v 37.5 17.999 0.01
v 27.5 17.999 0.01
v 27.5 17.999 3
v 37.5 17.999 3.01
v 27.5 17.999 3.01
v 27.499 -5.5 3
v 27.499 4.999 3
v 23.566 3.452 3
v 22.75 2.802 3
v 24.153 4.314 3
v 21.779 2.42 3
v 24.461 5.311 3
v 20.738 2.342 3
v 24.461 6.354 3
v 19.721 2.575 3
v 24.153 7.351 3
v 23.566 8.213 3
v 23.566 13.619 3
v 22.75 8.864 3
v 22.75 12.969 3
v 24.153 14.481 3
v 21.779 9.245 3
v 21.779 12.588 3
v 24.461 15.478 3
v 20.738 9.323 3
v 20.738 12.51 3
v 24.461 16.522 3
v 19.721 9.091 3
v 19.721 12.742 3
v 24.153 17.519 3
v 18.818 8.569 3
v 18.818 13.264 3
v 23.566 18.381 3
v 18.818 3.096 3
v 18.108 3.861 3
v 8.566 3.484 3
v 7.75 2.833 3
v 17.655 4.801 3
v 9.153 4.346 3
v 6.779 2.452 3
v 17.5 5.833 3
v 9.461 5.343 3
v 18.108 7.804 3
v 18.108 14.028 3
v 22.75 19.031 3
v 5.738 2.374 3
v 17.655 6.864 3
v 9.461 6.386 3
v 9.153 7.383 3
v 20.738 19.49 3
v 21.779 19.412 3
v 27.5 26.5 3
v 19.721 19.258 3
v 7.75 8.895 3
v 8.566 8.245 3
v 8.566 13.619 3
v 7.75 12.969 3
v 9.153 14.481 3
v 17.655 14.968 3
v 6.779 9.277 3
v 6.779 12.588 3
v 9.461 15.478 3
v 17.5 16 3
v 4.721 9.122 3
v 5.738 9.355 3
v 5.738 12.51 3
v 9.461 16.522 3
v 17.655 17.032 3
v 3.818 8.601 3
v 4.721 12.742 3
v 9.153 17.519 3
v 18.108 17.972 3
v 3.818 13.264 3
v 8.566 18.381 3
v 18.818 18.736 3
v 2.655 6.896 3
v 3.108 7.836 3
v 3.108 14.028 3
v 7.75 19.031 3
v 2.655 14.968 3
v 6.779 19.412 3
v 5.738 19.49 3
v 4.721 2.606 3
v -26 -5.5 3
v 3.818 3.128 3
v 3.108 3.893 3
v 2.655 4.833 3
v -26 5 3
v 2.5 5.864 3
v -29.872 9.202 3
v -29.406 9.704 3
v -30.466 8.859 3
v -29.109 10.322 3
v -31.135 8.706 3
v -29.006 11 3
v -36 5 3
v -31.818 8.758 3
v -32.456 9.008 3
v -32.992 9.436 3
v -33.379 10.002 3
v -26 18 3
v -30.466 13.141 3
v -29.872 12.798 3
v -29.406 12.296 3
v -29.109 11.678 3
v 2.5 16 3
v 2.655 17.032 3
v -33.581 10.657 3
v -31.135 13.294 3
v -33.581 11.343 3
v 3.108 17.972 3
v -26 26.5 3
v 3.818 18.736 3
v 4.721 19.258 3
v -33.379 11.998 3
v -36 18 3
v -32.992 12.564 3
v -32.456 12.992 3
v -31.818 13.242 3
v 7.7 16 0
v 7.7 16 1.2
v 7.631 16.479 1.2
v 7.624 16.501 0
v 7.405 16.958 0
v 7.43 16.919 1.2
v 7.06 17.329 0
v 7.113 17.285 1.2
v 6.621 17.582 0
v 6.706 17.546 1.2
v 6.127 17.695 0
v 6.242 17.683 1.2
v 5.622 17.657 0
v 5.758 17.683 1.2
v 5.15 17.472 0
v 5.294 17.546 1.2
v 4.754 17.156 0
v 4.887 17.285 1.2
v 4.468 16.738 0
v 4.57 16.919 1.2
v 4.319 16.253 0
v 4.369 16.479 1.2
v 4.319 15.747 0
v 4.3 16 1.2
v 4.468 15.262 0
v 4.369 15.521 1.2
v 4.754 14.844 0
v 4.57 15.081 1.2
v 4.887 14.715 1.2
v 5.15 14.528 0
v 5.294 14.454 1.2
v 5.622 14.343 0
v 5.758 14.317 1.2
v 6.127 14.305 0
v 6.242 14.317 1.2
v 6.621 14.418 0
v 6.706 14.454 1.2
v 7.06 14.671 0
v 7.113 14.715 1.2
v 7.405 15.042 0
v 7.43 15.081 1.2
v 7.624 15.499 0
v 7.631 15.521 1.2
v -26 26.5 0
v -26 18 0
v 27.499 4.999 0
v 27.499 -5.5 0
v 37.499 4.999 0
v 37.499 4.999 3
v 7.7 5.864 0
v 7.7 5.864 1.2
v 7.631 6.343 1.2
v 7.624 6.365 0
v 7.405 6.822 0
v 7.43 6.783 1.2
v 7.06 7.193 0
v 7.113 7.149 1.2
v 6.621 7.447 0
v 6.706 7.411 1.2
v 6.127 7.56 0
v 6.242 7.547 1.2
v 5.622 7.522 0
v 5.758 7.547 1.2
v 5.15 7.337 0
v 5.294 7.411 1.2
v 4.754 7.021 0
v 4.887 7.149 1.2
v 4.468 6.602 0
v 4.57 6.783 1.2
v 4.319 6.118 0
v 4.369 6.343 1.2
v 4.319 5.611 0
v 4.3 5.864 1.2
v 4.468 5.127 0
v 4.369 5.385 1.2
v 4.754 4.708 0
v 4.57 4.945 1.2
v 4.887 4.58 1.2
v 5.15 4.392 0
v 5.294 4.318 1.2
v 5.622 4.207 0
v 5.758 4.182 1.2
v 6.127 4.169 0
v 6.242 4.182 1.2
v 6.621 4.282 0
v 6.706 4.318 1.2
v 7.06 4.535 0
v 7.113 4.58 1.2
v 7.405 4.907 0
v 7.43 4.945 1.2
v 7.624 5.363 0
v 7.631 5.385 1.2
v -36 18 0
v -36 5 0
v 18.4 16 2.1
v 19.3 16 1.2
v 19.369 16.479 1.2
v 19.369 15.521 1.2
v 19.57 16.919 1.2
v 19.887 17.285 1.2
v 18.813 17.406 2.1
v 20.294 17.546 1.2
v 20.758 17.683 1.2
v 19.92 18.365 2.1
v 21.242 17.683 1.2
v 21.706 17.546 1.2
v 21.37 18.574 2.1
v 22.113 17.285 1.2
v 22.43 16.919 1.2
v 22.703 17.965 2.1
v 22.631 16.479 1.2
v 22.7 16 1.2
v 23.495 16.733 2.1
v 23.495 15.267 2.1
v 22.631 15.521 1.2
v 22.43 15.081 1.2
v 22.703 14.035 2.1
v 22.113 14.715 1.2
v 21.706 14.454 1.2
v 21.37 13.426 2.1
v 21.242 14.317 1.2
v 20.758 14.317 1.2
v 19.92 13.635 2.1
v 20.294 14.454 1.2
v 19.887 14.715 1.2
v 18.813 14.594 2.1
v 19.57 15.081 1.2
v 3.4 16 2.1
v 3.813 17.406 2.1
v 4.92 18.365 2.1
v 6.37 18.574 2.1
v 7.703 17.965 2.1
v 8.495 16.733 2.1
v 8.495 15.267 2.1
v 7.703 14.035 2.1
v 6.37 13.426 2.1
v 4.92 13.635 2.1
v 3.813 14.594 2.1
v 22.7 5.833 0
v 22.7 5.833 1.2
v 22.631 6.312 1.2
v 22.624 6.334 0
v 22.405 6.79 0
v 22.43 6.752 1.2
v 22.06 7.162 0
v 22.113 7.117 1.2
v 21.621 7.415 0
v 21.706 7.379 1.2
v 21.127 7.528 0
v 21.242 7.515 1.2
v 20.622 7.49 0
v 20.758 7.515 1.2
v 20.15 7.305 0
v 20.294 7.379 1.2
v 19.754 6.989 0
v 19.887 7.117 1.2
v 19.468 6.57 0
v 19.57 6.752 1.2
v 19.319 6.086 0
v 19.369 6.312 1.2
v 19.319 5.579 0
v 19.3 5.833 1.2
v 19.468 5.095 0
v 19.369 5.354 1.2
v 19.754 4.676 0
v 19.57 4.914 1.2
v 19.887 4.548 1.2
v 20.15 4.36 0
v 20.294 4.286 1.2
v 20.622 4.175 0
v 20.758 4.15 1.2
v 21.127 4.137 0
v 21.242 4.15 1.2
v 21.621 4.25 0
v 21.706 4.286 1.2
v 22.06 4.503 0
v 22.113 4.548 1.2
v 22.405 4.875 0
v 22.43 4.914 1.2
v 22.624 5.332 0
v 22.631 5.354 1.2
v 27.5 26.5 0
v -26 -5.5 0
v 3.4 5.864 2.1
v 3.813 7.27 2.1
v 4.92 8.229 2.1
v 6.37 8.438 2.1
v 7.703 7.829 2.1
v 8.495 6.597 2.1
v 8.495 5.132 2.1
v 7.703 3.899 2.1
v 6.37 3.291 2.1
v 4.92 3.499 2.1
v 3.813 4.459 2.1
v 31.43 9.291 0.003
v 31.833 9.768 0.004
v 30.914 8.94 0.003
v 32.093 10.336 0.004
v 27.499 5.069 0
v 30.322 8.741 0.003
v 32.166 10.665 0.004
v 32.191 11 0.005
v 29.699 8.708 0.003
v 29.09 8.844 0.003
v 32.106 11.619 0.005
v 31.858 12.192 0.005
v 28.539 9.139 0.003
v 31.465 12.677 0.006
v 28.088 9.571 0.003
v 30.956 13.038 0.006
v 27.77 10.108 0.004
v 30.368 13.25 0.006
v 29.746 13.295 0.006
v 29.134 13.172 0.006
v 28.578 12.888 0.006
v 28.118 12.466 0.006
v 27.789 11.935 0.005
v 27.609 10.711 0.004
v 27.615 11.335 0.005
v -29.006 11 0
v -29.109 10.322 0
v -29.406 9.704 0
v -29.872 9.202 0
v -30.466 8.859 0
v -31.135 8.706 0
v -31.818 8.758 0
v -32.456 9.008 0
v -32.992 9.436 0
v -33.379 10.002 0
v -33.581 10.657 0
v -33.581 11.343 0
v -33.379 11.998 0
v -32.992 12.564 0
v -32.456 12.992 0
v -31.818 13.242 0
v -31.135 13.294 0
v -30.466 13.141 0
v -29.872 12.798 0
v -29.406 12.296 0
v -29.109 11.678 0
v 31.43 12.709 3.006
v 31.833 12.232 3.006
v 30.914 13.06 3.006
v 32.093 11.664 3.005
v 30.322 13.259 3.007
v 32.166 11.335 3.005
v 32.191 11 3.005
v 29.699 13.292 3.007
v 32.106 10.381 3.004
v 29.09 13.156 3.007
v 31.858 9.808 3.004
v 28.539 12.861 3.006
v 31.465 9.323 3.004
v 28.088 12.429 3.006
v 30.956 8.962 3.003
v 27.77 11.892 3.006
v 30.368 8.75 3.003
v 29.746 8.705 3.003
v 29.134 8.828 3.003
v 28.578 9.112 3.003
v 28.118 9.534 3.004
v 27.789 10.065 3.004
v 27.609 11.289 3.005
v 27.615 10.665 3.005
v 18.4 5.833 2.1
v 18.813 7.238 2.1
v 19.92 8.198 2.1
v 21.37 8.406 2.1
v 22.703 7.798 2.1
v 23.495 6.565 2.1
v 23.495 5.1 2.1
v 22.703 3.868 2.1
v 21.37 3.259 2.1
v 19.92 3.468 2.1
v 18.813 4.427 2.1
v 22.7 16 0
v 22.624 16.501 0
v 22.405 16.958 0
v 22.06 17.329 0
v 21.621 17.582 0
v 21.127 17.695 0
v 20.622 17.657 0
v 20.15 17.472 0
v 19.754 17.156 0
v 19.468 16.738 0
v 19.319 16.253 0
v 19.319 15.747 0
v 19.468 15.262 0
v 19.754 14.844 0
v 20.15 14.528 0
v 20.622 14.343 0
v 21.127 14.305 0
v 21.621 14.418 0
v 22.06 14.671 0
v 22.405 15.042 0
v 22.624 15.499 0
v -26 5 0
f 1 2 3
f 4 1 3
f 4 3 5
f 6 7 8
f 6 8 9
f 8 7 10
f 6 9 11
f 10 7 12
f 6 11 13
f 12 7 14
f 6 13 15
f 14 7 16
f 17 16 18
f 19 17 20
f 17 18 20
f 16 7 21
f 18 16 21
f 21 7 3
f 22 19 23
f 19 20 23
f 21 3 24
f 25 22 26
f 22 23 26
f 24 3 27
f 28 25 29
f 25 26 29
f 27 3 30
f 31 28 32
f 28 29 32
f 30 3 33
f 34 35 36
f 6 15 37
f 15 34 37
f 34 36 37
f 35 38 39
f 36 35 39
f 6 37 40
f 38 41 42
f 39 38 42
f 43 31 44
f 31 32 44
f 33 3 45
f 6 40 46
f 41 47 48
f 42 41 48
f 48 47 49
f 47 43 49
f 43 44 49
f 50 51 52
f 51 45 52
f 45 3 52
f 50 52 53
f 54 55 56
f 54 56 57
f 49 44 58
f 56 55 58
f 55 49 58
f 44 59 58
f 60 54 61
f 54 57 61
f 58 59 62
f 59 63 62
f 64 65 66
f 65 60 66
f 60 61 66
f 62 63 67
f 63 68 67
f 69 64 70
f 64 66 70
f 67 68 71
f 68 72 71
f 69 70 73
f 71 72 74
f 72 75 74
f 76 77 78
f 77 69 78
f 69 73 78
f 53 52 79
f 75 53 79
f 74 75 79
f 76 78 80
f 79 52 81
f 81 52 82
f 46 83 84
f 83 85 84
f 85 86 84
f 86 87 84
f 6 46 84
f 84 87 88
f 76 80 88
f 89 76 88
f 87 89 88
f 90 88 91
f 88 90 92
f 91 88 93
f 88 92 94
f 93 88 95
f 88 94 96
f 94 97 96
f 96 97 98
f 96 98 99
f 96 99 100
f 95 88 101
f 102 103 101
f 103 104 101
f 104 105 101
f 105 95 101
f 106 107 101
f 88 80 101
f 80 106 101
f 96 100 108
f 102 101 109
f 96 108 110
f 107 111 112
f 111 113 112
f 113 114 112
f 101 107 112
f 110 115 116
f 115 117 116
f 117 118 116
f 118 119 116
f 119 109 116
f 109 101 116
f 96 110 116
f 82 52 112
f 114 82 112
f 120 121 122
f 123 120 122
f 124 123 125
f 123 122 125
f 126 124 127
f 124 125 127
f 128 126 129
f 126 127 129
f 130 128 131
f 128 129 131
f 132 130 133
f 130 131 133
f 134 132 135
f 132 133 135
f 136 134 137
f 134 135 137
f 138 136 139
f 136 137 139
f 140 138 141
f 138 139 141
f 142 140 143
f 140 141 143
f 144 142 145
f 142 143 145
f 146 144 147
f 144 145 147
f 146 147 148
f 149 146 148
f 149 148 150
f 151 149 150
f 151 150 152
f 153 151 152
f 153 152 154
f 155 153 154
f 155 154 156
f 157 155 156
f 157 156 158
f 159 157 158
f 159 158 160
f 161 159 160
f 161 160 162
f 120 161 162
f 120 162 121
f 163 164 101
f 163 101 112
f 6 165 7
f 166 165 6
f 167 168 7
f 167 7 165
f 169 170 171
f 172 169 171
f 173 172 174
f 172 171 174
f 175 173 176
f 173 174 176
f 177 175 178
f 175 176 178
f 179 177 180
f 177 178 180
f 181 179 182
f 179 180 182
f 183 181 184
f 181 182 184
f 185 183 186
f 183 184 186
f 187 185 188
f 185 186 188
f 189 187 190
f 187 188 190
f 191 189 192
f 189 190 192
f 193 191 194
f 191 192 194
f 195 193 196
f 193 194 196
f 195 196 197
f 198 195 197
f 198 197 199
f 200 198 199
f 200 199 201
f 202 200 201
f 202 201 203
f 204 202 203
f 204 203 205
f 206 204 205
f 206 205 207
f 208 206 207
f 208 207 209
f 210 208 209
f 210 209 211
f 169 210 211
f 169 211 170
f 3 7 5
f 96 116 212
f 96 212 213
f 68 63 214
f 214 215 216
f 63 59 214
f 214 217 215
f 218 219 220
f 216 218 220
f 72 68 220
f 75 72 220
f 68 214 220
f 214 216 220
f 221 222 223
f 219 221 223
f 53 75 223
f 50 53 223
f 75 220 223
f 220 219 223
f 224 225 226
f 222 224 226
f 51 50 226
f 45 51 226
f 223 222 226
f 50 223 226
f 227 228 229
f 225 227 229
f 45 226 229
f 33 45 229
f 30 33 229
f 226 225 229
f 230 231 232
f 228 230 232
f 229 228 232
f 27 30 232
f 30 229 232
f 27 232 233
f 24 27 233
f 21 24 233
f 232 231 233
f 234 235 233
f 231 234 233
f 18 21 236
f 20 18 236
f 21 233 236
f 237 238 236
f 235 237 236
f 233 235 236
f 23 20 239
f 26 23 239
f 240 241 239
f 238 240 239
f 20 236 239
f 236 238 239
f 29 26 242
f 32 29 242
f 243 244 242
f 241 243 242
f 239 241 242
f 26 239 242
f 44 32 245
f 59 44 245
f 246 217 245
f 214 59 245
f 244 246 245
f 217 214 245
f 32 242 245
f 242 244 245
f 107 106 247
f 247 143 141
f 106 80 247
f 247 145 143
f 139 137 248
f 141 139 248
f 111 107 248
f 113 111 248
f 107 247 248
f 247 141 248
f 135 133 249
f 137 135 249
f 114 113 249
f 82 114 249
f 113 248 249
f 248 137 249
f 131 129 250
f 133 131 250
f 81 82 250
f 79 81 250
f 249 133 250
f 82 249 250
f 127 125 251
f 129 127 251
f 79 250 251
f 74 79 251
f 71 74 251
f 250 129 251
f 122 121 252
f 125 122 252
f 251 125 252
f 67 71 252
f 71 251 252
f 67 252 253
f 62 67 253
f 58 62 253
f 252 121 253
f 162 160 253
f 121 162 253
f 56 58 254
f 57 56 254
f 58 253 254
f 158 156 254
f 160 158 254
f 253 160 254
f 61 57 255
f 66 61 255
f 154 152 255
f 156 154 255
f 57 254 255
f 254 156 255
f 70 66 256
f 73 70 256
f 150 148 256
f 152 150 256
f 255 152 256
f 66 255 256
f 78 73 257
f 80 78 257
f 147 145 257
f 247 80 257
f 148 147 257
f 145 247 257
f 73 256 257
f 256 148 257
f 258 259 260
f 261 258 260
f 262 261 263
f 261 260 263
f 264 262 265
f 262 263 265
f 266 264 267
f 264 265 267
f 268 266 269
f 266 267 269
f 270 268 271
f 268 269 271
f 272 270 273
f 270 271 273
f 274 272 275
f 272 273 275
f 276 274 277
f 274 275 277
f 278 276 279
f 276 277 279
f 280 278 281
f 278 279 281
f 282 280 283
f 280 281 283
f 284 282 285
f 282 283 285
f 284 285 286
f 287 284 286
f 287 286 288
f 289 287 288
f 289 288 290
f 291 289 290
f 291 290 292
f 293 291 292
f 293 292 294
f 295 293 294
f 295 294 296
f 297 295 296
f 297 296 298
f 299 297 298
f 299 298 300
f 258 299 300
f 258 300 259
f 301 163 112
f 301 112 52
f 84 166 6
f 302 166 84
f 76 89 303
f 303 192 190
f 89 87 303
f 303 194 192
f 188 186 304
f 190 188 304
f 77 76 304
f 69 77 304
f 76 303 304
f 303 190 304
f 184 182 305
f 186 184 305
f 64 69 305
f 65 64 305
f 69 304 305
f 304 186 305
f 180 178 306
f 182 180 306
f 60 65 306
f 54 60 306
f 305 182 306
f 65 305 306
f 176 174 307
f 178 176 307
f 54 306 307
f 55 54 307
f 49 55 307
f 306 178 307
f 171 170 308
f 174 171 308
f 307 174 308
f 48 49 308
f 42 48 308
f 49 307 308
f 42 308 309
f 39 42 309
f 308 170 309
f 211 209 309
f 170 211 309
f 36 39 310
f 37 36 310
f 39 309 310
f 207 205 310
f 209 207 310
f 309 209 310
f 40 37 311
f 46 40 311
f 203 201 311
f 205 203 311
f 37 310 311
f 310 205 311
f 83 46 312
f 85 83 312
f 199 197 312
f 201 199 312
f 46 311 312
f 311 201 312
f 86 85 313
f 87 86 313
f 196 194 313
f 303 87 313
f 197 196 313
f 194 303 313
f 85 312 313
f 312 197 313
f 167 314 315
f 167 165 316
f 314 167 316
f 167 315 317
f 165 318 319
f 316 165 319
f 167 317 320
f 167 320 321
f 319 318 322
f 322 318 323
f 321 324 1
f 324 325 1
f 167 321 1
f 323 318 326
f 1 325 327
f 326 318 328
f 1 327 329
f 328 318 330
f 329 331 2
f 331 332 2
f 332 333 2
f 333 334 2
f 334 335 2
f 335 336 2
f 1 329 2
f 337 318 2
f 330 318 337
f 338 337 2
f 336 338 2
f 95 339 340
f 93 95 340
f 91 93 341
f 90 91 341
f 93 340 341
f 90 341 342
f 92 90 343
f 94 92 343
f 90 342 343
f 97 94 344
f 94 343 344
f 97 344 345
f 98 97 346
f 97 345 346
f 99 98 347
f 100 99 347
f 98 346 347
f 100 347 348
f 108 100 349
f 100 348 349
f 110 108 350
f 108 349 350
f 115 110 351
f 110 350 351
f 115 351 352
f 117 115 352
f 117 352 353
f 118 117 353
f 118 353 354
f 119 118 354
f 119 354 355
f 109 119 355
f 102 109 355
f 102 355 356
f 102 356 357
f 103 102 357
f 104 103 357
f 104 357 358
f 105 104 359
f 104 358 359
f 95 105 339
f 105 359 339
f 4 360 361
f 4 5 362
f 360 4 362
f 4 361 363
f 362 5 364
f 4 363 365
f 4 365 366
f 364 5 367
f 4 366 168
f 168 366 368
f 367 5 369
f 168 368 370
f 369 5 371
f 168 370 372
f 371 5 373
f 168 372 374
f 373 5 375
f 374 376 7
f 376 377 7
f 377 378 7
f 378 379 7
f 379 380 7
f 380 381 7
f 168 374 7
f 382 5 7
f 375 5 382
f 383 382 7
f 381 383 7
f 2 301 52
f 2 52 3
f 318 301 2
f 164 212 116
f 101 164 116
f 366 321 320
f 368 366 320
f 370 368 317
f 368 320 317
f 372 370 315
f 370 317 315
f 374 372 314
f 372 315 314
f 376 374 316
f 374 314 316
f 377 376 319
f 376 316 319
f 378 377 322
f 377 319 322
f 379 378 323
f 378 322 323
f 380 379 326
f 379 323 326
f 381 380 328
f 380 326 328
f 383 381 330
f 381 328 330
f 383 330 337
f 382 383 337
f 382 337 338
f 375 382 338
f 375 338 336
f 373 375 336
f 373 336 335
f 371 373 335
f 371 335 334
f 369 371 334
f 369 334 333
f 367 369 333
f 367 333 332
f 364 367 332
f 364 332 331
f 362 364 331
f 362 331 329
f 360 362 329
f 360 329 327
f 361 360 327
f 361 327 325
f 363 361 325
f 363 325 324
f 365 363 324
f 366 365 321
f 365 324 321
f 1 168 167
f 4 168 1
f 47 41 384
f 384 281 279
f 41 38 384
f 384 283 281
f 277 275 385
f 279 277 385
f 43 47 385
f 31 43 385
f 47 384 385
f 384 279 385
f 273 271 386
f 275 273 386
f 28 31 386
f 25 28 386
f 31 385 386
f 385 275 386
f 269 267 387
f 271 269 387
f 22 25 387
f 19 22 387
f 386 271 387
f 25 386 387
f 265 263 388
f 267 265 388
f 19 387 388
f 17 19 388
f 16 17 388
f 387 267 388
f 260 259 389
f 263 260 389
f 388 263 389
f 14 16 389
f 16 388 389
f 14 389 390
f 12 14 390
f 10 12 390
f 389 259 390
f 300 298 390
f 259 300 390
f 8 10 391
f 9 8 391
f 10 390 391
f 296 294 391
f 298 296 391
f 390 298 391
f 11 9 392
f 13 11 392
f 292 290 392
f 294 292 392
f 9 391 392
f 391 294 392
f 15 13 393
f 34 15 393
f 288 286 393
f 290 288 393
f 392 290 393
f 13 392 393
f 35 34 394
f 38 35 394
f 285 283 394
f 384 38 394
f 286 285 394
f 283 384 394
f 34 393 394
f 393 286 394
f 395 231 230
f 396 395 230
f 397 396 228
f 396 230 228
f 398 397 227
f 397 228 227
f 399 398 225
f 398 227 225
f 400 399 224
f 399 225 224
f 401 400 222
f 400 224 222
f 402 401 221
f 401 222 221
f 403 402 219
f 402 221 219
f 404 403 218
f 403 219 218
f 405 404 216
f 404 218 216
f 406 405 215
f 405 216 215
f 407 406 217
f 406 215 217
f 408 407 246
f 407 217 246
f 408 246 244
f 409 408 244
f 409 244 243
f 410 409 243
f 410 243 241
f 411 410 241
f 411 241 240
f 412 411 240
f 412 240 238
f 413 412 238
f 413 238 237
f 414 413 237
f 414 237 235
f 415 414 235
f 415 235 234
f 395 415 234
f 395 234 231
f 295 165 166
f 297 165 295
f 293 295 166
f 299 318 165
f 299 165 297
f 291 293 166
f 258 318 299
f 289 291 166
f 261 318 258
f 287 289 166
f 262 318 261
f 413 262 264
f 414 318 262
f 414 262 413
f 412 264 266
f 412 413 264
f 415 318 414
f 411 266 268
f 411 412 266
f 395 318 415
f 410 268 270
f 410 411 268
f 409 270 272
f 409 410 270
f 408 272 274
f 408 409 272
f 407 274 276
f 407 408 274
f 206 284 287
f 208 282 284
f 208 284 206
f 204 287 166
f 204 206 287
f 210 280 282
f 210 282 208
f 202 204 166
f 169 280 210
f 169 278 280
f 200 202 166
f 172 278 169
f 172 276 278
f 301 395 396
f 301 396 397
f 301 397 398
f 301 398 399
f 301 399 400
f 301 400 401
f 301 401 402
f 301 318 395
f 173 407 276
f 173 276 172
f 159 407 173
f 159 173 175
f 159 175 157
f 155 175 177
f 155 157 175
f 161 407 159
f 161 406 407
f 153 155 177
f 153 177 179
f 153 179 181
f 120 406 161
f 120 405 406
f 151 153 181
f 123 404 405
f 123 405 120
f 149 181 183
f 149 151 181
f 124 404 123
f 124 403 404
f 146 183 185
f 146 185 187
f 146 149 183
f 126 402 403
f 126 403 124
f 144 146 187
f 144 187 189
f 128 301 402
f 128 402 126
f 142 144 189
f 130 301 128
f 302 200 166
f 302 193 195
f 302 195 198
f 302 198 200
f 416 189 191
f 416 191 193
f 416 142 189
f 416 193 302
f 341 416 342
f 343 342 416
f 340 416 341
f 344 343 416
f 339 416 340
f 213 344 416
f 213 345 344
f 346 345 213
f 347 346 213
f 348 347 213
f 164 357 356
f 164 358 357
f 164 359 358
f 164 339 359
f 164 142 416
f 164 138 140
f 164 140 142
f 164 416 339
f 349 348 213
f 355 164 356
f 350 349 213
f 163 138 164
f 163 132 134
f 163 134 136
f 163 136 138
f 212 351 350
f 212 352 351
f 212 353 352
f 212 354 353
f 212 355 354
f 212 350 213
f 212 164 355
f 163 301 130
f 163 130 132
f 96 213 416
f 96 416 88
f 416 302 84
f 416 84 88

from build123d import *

# Parameters (mm, degrees)
PAD_DEPTH        = 3
SKETCH001_R      = 1.7
POCKET_DEPTH     = 3
SKETCH002_W      = 13
SKETCH002_H      = 3
PAD001_DEPTH     = 10
PAD002_DEPTH     = 10
SKETCH011_R      = 2.3
POCKET003_DEPTH  = 3
POCKET004_DEPTH  = 4
HOLE_D           = 1.75
HOLE_DEPTH       = 14
HOLE_CSINK_D     = 7
HOLE_CSINK_ANGLE = 90


with BuildPart() as part:
    # Sketch → Pad (new body)
    with BuildSketch(Plane.XY):
        Polygon((-26, 26.4999999928), (27.5, 26.4999999928), (27.49902347, -5.4999999923), (-26, -5.5000000072), align=None)
    extrude(amount=PAD_DEPTH)

    # Sketch001 (on Face6 of Pad) → Pocket (cut)
    with BuildSketch(Plane.XY.offset(3)):
        with Locations((6, 16)):
            Circle(SKETCH001_R)
        with Locations((21, 16)):
            Circle(SKETCH001_R)
        with Locations((6, 5.8643429572)):
            Circle(SKETCH001_R)
        with Locations((20.9999664256, 5.8326060428)):
            Circle(SKETCH001_R)
    extrude(amount=-POCKET_DEPTH, mode=Mode.SUBTRACT)

    # Sketch002 (on Face2 of Pocket) → Pad001 (join)
    with BuildSketch(Plane(origin=(-26, 0, 0), x_dir=(0, -1, 0), z_dir=(-1, 0, 0))):
        with Locations((-11.5, 1.5)):
            Rectangle(SKETCH002_W, SKETCH002_H)
    extrude(amount=PAD001_DEPTH)

    # Sketch003 (on Face3 of Pad001) → Pad002 (join)
    with BuildSketch(Plane(origin=(27.4991912855, -0.0008391808, 0), x_dir=(3.05166e-05, 0.9999999995, 0), z_dir=(0.9999999995, -3.05166e-05, 0))):
        Polygon((4.9999999997, -5.34717e-05), (18, 0.0098544685), (18, 3.0102239098), (4.9999999997, 3.0003159696), align=None)
    extrude(amount=PAD002_DEPTH)

    # Sketch011 (on Face10 of Pad002) → Pocket003 (cut)
    with BuildSketch(Plane(origin=(0, 0, 0), x_dir=(1, 0, 0), z_dir=(0, 0, -1))):
        with Locations((-31.3064256507, -11)):
            Circle(SKETCH011_R)
        with Locations((29.8905204819, -11)):
            Circle(SKETCH011_R)
    extrude(amount=-POCKET003_DEPTH, mode=Mode.SUBTRACT)

    # Sketch011 (on Face10 of Pad002) → Pocket004 (cut)
    with BuildSketch(Plane(origin=(0, 0, 0), x_dir=(1, 0, 0), z_dir=(0, 0, -1))):
        with Locations((-31.3064256507, -11)):
            Circle(SKETCH011_R)
        with Locations((29.8905204819, -11)):
            Circle(SKETCH011_R)
    extrude(amount=-POCKET004_DEPTH, mode=Mode.SUBTRACT)

    # Hole
    with Locations(Plane.XY.offset(3)):
        with Locations((6, 16), (21, 16), (6, 5.8643429572), (20.9999664256, 5.8326060428)):
            CounterSinkHole(HOLE_D / 2, HOLE_CSINK_D / 2, depth=HOLE_DEPTH, counter_sink_angle=HOLE_CSINK_ANGLE)


solid = part.part
